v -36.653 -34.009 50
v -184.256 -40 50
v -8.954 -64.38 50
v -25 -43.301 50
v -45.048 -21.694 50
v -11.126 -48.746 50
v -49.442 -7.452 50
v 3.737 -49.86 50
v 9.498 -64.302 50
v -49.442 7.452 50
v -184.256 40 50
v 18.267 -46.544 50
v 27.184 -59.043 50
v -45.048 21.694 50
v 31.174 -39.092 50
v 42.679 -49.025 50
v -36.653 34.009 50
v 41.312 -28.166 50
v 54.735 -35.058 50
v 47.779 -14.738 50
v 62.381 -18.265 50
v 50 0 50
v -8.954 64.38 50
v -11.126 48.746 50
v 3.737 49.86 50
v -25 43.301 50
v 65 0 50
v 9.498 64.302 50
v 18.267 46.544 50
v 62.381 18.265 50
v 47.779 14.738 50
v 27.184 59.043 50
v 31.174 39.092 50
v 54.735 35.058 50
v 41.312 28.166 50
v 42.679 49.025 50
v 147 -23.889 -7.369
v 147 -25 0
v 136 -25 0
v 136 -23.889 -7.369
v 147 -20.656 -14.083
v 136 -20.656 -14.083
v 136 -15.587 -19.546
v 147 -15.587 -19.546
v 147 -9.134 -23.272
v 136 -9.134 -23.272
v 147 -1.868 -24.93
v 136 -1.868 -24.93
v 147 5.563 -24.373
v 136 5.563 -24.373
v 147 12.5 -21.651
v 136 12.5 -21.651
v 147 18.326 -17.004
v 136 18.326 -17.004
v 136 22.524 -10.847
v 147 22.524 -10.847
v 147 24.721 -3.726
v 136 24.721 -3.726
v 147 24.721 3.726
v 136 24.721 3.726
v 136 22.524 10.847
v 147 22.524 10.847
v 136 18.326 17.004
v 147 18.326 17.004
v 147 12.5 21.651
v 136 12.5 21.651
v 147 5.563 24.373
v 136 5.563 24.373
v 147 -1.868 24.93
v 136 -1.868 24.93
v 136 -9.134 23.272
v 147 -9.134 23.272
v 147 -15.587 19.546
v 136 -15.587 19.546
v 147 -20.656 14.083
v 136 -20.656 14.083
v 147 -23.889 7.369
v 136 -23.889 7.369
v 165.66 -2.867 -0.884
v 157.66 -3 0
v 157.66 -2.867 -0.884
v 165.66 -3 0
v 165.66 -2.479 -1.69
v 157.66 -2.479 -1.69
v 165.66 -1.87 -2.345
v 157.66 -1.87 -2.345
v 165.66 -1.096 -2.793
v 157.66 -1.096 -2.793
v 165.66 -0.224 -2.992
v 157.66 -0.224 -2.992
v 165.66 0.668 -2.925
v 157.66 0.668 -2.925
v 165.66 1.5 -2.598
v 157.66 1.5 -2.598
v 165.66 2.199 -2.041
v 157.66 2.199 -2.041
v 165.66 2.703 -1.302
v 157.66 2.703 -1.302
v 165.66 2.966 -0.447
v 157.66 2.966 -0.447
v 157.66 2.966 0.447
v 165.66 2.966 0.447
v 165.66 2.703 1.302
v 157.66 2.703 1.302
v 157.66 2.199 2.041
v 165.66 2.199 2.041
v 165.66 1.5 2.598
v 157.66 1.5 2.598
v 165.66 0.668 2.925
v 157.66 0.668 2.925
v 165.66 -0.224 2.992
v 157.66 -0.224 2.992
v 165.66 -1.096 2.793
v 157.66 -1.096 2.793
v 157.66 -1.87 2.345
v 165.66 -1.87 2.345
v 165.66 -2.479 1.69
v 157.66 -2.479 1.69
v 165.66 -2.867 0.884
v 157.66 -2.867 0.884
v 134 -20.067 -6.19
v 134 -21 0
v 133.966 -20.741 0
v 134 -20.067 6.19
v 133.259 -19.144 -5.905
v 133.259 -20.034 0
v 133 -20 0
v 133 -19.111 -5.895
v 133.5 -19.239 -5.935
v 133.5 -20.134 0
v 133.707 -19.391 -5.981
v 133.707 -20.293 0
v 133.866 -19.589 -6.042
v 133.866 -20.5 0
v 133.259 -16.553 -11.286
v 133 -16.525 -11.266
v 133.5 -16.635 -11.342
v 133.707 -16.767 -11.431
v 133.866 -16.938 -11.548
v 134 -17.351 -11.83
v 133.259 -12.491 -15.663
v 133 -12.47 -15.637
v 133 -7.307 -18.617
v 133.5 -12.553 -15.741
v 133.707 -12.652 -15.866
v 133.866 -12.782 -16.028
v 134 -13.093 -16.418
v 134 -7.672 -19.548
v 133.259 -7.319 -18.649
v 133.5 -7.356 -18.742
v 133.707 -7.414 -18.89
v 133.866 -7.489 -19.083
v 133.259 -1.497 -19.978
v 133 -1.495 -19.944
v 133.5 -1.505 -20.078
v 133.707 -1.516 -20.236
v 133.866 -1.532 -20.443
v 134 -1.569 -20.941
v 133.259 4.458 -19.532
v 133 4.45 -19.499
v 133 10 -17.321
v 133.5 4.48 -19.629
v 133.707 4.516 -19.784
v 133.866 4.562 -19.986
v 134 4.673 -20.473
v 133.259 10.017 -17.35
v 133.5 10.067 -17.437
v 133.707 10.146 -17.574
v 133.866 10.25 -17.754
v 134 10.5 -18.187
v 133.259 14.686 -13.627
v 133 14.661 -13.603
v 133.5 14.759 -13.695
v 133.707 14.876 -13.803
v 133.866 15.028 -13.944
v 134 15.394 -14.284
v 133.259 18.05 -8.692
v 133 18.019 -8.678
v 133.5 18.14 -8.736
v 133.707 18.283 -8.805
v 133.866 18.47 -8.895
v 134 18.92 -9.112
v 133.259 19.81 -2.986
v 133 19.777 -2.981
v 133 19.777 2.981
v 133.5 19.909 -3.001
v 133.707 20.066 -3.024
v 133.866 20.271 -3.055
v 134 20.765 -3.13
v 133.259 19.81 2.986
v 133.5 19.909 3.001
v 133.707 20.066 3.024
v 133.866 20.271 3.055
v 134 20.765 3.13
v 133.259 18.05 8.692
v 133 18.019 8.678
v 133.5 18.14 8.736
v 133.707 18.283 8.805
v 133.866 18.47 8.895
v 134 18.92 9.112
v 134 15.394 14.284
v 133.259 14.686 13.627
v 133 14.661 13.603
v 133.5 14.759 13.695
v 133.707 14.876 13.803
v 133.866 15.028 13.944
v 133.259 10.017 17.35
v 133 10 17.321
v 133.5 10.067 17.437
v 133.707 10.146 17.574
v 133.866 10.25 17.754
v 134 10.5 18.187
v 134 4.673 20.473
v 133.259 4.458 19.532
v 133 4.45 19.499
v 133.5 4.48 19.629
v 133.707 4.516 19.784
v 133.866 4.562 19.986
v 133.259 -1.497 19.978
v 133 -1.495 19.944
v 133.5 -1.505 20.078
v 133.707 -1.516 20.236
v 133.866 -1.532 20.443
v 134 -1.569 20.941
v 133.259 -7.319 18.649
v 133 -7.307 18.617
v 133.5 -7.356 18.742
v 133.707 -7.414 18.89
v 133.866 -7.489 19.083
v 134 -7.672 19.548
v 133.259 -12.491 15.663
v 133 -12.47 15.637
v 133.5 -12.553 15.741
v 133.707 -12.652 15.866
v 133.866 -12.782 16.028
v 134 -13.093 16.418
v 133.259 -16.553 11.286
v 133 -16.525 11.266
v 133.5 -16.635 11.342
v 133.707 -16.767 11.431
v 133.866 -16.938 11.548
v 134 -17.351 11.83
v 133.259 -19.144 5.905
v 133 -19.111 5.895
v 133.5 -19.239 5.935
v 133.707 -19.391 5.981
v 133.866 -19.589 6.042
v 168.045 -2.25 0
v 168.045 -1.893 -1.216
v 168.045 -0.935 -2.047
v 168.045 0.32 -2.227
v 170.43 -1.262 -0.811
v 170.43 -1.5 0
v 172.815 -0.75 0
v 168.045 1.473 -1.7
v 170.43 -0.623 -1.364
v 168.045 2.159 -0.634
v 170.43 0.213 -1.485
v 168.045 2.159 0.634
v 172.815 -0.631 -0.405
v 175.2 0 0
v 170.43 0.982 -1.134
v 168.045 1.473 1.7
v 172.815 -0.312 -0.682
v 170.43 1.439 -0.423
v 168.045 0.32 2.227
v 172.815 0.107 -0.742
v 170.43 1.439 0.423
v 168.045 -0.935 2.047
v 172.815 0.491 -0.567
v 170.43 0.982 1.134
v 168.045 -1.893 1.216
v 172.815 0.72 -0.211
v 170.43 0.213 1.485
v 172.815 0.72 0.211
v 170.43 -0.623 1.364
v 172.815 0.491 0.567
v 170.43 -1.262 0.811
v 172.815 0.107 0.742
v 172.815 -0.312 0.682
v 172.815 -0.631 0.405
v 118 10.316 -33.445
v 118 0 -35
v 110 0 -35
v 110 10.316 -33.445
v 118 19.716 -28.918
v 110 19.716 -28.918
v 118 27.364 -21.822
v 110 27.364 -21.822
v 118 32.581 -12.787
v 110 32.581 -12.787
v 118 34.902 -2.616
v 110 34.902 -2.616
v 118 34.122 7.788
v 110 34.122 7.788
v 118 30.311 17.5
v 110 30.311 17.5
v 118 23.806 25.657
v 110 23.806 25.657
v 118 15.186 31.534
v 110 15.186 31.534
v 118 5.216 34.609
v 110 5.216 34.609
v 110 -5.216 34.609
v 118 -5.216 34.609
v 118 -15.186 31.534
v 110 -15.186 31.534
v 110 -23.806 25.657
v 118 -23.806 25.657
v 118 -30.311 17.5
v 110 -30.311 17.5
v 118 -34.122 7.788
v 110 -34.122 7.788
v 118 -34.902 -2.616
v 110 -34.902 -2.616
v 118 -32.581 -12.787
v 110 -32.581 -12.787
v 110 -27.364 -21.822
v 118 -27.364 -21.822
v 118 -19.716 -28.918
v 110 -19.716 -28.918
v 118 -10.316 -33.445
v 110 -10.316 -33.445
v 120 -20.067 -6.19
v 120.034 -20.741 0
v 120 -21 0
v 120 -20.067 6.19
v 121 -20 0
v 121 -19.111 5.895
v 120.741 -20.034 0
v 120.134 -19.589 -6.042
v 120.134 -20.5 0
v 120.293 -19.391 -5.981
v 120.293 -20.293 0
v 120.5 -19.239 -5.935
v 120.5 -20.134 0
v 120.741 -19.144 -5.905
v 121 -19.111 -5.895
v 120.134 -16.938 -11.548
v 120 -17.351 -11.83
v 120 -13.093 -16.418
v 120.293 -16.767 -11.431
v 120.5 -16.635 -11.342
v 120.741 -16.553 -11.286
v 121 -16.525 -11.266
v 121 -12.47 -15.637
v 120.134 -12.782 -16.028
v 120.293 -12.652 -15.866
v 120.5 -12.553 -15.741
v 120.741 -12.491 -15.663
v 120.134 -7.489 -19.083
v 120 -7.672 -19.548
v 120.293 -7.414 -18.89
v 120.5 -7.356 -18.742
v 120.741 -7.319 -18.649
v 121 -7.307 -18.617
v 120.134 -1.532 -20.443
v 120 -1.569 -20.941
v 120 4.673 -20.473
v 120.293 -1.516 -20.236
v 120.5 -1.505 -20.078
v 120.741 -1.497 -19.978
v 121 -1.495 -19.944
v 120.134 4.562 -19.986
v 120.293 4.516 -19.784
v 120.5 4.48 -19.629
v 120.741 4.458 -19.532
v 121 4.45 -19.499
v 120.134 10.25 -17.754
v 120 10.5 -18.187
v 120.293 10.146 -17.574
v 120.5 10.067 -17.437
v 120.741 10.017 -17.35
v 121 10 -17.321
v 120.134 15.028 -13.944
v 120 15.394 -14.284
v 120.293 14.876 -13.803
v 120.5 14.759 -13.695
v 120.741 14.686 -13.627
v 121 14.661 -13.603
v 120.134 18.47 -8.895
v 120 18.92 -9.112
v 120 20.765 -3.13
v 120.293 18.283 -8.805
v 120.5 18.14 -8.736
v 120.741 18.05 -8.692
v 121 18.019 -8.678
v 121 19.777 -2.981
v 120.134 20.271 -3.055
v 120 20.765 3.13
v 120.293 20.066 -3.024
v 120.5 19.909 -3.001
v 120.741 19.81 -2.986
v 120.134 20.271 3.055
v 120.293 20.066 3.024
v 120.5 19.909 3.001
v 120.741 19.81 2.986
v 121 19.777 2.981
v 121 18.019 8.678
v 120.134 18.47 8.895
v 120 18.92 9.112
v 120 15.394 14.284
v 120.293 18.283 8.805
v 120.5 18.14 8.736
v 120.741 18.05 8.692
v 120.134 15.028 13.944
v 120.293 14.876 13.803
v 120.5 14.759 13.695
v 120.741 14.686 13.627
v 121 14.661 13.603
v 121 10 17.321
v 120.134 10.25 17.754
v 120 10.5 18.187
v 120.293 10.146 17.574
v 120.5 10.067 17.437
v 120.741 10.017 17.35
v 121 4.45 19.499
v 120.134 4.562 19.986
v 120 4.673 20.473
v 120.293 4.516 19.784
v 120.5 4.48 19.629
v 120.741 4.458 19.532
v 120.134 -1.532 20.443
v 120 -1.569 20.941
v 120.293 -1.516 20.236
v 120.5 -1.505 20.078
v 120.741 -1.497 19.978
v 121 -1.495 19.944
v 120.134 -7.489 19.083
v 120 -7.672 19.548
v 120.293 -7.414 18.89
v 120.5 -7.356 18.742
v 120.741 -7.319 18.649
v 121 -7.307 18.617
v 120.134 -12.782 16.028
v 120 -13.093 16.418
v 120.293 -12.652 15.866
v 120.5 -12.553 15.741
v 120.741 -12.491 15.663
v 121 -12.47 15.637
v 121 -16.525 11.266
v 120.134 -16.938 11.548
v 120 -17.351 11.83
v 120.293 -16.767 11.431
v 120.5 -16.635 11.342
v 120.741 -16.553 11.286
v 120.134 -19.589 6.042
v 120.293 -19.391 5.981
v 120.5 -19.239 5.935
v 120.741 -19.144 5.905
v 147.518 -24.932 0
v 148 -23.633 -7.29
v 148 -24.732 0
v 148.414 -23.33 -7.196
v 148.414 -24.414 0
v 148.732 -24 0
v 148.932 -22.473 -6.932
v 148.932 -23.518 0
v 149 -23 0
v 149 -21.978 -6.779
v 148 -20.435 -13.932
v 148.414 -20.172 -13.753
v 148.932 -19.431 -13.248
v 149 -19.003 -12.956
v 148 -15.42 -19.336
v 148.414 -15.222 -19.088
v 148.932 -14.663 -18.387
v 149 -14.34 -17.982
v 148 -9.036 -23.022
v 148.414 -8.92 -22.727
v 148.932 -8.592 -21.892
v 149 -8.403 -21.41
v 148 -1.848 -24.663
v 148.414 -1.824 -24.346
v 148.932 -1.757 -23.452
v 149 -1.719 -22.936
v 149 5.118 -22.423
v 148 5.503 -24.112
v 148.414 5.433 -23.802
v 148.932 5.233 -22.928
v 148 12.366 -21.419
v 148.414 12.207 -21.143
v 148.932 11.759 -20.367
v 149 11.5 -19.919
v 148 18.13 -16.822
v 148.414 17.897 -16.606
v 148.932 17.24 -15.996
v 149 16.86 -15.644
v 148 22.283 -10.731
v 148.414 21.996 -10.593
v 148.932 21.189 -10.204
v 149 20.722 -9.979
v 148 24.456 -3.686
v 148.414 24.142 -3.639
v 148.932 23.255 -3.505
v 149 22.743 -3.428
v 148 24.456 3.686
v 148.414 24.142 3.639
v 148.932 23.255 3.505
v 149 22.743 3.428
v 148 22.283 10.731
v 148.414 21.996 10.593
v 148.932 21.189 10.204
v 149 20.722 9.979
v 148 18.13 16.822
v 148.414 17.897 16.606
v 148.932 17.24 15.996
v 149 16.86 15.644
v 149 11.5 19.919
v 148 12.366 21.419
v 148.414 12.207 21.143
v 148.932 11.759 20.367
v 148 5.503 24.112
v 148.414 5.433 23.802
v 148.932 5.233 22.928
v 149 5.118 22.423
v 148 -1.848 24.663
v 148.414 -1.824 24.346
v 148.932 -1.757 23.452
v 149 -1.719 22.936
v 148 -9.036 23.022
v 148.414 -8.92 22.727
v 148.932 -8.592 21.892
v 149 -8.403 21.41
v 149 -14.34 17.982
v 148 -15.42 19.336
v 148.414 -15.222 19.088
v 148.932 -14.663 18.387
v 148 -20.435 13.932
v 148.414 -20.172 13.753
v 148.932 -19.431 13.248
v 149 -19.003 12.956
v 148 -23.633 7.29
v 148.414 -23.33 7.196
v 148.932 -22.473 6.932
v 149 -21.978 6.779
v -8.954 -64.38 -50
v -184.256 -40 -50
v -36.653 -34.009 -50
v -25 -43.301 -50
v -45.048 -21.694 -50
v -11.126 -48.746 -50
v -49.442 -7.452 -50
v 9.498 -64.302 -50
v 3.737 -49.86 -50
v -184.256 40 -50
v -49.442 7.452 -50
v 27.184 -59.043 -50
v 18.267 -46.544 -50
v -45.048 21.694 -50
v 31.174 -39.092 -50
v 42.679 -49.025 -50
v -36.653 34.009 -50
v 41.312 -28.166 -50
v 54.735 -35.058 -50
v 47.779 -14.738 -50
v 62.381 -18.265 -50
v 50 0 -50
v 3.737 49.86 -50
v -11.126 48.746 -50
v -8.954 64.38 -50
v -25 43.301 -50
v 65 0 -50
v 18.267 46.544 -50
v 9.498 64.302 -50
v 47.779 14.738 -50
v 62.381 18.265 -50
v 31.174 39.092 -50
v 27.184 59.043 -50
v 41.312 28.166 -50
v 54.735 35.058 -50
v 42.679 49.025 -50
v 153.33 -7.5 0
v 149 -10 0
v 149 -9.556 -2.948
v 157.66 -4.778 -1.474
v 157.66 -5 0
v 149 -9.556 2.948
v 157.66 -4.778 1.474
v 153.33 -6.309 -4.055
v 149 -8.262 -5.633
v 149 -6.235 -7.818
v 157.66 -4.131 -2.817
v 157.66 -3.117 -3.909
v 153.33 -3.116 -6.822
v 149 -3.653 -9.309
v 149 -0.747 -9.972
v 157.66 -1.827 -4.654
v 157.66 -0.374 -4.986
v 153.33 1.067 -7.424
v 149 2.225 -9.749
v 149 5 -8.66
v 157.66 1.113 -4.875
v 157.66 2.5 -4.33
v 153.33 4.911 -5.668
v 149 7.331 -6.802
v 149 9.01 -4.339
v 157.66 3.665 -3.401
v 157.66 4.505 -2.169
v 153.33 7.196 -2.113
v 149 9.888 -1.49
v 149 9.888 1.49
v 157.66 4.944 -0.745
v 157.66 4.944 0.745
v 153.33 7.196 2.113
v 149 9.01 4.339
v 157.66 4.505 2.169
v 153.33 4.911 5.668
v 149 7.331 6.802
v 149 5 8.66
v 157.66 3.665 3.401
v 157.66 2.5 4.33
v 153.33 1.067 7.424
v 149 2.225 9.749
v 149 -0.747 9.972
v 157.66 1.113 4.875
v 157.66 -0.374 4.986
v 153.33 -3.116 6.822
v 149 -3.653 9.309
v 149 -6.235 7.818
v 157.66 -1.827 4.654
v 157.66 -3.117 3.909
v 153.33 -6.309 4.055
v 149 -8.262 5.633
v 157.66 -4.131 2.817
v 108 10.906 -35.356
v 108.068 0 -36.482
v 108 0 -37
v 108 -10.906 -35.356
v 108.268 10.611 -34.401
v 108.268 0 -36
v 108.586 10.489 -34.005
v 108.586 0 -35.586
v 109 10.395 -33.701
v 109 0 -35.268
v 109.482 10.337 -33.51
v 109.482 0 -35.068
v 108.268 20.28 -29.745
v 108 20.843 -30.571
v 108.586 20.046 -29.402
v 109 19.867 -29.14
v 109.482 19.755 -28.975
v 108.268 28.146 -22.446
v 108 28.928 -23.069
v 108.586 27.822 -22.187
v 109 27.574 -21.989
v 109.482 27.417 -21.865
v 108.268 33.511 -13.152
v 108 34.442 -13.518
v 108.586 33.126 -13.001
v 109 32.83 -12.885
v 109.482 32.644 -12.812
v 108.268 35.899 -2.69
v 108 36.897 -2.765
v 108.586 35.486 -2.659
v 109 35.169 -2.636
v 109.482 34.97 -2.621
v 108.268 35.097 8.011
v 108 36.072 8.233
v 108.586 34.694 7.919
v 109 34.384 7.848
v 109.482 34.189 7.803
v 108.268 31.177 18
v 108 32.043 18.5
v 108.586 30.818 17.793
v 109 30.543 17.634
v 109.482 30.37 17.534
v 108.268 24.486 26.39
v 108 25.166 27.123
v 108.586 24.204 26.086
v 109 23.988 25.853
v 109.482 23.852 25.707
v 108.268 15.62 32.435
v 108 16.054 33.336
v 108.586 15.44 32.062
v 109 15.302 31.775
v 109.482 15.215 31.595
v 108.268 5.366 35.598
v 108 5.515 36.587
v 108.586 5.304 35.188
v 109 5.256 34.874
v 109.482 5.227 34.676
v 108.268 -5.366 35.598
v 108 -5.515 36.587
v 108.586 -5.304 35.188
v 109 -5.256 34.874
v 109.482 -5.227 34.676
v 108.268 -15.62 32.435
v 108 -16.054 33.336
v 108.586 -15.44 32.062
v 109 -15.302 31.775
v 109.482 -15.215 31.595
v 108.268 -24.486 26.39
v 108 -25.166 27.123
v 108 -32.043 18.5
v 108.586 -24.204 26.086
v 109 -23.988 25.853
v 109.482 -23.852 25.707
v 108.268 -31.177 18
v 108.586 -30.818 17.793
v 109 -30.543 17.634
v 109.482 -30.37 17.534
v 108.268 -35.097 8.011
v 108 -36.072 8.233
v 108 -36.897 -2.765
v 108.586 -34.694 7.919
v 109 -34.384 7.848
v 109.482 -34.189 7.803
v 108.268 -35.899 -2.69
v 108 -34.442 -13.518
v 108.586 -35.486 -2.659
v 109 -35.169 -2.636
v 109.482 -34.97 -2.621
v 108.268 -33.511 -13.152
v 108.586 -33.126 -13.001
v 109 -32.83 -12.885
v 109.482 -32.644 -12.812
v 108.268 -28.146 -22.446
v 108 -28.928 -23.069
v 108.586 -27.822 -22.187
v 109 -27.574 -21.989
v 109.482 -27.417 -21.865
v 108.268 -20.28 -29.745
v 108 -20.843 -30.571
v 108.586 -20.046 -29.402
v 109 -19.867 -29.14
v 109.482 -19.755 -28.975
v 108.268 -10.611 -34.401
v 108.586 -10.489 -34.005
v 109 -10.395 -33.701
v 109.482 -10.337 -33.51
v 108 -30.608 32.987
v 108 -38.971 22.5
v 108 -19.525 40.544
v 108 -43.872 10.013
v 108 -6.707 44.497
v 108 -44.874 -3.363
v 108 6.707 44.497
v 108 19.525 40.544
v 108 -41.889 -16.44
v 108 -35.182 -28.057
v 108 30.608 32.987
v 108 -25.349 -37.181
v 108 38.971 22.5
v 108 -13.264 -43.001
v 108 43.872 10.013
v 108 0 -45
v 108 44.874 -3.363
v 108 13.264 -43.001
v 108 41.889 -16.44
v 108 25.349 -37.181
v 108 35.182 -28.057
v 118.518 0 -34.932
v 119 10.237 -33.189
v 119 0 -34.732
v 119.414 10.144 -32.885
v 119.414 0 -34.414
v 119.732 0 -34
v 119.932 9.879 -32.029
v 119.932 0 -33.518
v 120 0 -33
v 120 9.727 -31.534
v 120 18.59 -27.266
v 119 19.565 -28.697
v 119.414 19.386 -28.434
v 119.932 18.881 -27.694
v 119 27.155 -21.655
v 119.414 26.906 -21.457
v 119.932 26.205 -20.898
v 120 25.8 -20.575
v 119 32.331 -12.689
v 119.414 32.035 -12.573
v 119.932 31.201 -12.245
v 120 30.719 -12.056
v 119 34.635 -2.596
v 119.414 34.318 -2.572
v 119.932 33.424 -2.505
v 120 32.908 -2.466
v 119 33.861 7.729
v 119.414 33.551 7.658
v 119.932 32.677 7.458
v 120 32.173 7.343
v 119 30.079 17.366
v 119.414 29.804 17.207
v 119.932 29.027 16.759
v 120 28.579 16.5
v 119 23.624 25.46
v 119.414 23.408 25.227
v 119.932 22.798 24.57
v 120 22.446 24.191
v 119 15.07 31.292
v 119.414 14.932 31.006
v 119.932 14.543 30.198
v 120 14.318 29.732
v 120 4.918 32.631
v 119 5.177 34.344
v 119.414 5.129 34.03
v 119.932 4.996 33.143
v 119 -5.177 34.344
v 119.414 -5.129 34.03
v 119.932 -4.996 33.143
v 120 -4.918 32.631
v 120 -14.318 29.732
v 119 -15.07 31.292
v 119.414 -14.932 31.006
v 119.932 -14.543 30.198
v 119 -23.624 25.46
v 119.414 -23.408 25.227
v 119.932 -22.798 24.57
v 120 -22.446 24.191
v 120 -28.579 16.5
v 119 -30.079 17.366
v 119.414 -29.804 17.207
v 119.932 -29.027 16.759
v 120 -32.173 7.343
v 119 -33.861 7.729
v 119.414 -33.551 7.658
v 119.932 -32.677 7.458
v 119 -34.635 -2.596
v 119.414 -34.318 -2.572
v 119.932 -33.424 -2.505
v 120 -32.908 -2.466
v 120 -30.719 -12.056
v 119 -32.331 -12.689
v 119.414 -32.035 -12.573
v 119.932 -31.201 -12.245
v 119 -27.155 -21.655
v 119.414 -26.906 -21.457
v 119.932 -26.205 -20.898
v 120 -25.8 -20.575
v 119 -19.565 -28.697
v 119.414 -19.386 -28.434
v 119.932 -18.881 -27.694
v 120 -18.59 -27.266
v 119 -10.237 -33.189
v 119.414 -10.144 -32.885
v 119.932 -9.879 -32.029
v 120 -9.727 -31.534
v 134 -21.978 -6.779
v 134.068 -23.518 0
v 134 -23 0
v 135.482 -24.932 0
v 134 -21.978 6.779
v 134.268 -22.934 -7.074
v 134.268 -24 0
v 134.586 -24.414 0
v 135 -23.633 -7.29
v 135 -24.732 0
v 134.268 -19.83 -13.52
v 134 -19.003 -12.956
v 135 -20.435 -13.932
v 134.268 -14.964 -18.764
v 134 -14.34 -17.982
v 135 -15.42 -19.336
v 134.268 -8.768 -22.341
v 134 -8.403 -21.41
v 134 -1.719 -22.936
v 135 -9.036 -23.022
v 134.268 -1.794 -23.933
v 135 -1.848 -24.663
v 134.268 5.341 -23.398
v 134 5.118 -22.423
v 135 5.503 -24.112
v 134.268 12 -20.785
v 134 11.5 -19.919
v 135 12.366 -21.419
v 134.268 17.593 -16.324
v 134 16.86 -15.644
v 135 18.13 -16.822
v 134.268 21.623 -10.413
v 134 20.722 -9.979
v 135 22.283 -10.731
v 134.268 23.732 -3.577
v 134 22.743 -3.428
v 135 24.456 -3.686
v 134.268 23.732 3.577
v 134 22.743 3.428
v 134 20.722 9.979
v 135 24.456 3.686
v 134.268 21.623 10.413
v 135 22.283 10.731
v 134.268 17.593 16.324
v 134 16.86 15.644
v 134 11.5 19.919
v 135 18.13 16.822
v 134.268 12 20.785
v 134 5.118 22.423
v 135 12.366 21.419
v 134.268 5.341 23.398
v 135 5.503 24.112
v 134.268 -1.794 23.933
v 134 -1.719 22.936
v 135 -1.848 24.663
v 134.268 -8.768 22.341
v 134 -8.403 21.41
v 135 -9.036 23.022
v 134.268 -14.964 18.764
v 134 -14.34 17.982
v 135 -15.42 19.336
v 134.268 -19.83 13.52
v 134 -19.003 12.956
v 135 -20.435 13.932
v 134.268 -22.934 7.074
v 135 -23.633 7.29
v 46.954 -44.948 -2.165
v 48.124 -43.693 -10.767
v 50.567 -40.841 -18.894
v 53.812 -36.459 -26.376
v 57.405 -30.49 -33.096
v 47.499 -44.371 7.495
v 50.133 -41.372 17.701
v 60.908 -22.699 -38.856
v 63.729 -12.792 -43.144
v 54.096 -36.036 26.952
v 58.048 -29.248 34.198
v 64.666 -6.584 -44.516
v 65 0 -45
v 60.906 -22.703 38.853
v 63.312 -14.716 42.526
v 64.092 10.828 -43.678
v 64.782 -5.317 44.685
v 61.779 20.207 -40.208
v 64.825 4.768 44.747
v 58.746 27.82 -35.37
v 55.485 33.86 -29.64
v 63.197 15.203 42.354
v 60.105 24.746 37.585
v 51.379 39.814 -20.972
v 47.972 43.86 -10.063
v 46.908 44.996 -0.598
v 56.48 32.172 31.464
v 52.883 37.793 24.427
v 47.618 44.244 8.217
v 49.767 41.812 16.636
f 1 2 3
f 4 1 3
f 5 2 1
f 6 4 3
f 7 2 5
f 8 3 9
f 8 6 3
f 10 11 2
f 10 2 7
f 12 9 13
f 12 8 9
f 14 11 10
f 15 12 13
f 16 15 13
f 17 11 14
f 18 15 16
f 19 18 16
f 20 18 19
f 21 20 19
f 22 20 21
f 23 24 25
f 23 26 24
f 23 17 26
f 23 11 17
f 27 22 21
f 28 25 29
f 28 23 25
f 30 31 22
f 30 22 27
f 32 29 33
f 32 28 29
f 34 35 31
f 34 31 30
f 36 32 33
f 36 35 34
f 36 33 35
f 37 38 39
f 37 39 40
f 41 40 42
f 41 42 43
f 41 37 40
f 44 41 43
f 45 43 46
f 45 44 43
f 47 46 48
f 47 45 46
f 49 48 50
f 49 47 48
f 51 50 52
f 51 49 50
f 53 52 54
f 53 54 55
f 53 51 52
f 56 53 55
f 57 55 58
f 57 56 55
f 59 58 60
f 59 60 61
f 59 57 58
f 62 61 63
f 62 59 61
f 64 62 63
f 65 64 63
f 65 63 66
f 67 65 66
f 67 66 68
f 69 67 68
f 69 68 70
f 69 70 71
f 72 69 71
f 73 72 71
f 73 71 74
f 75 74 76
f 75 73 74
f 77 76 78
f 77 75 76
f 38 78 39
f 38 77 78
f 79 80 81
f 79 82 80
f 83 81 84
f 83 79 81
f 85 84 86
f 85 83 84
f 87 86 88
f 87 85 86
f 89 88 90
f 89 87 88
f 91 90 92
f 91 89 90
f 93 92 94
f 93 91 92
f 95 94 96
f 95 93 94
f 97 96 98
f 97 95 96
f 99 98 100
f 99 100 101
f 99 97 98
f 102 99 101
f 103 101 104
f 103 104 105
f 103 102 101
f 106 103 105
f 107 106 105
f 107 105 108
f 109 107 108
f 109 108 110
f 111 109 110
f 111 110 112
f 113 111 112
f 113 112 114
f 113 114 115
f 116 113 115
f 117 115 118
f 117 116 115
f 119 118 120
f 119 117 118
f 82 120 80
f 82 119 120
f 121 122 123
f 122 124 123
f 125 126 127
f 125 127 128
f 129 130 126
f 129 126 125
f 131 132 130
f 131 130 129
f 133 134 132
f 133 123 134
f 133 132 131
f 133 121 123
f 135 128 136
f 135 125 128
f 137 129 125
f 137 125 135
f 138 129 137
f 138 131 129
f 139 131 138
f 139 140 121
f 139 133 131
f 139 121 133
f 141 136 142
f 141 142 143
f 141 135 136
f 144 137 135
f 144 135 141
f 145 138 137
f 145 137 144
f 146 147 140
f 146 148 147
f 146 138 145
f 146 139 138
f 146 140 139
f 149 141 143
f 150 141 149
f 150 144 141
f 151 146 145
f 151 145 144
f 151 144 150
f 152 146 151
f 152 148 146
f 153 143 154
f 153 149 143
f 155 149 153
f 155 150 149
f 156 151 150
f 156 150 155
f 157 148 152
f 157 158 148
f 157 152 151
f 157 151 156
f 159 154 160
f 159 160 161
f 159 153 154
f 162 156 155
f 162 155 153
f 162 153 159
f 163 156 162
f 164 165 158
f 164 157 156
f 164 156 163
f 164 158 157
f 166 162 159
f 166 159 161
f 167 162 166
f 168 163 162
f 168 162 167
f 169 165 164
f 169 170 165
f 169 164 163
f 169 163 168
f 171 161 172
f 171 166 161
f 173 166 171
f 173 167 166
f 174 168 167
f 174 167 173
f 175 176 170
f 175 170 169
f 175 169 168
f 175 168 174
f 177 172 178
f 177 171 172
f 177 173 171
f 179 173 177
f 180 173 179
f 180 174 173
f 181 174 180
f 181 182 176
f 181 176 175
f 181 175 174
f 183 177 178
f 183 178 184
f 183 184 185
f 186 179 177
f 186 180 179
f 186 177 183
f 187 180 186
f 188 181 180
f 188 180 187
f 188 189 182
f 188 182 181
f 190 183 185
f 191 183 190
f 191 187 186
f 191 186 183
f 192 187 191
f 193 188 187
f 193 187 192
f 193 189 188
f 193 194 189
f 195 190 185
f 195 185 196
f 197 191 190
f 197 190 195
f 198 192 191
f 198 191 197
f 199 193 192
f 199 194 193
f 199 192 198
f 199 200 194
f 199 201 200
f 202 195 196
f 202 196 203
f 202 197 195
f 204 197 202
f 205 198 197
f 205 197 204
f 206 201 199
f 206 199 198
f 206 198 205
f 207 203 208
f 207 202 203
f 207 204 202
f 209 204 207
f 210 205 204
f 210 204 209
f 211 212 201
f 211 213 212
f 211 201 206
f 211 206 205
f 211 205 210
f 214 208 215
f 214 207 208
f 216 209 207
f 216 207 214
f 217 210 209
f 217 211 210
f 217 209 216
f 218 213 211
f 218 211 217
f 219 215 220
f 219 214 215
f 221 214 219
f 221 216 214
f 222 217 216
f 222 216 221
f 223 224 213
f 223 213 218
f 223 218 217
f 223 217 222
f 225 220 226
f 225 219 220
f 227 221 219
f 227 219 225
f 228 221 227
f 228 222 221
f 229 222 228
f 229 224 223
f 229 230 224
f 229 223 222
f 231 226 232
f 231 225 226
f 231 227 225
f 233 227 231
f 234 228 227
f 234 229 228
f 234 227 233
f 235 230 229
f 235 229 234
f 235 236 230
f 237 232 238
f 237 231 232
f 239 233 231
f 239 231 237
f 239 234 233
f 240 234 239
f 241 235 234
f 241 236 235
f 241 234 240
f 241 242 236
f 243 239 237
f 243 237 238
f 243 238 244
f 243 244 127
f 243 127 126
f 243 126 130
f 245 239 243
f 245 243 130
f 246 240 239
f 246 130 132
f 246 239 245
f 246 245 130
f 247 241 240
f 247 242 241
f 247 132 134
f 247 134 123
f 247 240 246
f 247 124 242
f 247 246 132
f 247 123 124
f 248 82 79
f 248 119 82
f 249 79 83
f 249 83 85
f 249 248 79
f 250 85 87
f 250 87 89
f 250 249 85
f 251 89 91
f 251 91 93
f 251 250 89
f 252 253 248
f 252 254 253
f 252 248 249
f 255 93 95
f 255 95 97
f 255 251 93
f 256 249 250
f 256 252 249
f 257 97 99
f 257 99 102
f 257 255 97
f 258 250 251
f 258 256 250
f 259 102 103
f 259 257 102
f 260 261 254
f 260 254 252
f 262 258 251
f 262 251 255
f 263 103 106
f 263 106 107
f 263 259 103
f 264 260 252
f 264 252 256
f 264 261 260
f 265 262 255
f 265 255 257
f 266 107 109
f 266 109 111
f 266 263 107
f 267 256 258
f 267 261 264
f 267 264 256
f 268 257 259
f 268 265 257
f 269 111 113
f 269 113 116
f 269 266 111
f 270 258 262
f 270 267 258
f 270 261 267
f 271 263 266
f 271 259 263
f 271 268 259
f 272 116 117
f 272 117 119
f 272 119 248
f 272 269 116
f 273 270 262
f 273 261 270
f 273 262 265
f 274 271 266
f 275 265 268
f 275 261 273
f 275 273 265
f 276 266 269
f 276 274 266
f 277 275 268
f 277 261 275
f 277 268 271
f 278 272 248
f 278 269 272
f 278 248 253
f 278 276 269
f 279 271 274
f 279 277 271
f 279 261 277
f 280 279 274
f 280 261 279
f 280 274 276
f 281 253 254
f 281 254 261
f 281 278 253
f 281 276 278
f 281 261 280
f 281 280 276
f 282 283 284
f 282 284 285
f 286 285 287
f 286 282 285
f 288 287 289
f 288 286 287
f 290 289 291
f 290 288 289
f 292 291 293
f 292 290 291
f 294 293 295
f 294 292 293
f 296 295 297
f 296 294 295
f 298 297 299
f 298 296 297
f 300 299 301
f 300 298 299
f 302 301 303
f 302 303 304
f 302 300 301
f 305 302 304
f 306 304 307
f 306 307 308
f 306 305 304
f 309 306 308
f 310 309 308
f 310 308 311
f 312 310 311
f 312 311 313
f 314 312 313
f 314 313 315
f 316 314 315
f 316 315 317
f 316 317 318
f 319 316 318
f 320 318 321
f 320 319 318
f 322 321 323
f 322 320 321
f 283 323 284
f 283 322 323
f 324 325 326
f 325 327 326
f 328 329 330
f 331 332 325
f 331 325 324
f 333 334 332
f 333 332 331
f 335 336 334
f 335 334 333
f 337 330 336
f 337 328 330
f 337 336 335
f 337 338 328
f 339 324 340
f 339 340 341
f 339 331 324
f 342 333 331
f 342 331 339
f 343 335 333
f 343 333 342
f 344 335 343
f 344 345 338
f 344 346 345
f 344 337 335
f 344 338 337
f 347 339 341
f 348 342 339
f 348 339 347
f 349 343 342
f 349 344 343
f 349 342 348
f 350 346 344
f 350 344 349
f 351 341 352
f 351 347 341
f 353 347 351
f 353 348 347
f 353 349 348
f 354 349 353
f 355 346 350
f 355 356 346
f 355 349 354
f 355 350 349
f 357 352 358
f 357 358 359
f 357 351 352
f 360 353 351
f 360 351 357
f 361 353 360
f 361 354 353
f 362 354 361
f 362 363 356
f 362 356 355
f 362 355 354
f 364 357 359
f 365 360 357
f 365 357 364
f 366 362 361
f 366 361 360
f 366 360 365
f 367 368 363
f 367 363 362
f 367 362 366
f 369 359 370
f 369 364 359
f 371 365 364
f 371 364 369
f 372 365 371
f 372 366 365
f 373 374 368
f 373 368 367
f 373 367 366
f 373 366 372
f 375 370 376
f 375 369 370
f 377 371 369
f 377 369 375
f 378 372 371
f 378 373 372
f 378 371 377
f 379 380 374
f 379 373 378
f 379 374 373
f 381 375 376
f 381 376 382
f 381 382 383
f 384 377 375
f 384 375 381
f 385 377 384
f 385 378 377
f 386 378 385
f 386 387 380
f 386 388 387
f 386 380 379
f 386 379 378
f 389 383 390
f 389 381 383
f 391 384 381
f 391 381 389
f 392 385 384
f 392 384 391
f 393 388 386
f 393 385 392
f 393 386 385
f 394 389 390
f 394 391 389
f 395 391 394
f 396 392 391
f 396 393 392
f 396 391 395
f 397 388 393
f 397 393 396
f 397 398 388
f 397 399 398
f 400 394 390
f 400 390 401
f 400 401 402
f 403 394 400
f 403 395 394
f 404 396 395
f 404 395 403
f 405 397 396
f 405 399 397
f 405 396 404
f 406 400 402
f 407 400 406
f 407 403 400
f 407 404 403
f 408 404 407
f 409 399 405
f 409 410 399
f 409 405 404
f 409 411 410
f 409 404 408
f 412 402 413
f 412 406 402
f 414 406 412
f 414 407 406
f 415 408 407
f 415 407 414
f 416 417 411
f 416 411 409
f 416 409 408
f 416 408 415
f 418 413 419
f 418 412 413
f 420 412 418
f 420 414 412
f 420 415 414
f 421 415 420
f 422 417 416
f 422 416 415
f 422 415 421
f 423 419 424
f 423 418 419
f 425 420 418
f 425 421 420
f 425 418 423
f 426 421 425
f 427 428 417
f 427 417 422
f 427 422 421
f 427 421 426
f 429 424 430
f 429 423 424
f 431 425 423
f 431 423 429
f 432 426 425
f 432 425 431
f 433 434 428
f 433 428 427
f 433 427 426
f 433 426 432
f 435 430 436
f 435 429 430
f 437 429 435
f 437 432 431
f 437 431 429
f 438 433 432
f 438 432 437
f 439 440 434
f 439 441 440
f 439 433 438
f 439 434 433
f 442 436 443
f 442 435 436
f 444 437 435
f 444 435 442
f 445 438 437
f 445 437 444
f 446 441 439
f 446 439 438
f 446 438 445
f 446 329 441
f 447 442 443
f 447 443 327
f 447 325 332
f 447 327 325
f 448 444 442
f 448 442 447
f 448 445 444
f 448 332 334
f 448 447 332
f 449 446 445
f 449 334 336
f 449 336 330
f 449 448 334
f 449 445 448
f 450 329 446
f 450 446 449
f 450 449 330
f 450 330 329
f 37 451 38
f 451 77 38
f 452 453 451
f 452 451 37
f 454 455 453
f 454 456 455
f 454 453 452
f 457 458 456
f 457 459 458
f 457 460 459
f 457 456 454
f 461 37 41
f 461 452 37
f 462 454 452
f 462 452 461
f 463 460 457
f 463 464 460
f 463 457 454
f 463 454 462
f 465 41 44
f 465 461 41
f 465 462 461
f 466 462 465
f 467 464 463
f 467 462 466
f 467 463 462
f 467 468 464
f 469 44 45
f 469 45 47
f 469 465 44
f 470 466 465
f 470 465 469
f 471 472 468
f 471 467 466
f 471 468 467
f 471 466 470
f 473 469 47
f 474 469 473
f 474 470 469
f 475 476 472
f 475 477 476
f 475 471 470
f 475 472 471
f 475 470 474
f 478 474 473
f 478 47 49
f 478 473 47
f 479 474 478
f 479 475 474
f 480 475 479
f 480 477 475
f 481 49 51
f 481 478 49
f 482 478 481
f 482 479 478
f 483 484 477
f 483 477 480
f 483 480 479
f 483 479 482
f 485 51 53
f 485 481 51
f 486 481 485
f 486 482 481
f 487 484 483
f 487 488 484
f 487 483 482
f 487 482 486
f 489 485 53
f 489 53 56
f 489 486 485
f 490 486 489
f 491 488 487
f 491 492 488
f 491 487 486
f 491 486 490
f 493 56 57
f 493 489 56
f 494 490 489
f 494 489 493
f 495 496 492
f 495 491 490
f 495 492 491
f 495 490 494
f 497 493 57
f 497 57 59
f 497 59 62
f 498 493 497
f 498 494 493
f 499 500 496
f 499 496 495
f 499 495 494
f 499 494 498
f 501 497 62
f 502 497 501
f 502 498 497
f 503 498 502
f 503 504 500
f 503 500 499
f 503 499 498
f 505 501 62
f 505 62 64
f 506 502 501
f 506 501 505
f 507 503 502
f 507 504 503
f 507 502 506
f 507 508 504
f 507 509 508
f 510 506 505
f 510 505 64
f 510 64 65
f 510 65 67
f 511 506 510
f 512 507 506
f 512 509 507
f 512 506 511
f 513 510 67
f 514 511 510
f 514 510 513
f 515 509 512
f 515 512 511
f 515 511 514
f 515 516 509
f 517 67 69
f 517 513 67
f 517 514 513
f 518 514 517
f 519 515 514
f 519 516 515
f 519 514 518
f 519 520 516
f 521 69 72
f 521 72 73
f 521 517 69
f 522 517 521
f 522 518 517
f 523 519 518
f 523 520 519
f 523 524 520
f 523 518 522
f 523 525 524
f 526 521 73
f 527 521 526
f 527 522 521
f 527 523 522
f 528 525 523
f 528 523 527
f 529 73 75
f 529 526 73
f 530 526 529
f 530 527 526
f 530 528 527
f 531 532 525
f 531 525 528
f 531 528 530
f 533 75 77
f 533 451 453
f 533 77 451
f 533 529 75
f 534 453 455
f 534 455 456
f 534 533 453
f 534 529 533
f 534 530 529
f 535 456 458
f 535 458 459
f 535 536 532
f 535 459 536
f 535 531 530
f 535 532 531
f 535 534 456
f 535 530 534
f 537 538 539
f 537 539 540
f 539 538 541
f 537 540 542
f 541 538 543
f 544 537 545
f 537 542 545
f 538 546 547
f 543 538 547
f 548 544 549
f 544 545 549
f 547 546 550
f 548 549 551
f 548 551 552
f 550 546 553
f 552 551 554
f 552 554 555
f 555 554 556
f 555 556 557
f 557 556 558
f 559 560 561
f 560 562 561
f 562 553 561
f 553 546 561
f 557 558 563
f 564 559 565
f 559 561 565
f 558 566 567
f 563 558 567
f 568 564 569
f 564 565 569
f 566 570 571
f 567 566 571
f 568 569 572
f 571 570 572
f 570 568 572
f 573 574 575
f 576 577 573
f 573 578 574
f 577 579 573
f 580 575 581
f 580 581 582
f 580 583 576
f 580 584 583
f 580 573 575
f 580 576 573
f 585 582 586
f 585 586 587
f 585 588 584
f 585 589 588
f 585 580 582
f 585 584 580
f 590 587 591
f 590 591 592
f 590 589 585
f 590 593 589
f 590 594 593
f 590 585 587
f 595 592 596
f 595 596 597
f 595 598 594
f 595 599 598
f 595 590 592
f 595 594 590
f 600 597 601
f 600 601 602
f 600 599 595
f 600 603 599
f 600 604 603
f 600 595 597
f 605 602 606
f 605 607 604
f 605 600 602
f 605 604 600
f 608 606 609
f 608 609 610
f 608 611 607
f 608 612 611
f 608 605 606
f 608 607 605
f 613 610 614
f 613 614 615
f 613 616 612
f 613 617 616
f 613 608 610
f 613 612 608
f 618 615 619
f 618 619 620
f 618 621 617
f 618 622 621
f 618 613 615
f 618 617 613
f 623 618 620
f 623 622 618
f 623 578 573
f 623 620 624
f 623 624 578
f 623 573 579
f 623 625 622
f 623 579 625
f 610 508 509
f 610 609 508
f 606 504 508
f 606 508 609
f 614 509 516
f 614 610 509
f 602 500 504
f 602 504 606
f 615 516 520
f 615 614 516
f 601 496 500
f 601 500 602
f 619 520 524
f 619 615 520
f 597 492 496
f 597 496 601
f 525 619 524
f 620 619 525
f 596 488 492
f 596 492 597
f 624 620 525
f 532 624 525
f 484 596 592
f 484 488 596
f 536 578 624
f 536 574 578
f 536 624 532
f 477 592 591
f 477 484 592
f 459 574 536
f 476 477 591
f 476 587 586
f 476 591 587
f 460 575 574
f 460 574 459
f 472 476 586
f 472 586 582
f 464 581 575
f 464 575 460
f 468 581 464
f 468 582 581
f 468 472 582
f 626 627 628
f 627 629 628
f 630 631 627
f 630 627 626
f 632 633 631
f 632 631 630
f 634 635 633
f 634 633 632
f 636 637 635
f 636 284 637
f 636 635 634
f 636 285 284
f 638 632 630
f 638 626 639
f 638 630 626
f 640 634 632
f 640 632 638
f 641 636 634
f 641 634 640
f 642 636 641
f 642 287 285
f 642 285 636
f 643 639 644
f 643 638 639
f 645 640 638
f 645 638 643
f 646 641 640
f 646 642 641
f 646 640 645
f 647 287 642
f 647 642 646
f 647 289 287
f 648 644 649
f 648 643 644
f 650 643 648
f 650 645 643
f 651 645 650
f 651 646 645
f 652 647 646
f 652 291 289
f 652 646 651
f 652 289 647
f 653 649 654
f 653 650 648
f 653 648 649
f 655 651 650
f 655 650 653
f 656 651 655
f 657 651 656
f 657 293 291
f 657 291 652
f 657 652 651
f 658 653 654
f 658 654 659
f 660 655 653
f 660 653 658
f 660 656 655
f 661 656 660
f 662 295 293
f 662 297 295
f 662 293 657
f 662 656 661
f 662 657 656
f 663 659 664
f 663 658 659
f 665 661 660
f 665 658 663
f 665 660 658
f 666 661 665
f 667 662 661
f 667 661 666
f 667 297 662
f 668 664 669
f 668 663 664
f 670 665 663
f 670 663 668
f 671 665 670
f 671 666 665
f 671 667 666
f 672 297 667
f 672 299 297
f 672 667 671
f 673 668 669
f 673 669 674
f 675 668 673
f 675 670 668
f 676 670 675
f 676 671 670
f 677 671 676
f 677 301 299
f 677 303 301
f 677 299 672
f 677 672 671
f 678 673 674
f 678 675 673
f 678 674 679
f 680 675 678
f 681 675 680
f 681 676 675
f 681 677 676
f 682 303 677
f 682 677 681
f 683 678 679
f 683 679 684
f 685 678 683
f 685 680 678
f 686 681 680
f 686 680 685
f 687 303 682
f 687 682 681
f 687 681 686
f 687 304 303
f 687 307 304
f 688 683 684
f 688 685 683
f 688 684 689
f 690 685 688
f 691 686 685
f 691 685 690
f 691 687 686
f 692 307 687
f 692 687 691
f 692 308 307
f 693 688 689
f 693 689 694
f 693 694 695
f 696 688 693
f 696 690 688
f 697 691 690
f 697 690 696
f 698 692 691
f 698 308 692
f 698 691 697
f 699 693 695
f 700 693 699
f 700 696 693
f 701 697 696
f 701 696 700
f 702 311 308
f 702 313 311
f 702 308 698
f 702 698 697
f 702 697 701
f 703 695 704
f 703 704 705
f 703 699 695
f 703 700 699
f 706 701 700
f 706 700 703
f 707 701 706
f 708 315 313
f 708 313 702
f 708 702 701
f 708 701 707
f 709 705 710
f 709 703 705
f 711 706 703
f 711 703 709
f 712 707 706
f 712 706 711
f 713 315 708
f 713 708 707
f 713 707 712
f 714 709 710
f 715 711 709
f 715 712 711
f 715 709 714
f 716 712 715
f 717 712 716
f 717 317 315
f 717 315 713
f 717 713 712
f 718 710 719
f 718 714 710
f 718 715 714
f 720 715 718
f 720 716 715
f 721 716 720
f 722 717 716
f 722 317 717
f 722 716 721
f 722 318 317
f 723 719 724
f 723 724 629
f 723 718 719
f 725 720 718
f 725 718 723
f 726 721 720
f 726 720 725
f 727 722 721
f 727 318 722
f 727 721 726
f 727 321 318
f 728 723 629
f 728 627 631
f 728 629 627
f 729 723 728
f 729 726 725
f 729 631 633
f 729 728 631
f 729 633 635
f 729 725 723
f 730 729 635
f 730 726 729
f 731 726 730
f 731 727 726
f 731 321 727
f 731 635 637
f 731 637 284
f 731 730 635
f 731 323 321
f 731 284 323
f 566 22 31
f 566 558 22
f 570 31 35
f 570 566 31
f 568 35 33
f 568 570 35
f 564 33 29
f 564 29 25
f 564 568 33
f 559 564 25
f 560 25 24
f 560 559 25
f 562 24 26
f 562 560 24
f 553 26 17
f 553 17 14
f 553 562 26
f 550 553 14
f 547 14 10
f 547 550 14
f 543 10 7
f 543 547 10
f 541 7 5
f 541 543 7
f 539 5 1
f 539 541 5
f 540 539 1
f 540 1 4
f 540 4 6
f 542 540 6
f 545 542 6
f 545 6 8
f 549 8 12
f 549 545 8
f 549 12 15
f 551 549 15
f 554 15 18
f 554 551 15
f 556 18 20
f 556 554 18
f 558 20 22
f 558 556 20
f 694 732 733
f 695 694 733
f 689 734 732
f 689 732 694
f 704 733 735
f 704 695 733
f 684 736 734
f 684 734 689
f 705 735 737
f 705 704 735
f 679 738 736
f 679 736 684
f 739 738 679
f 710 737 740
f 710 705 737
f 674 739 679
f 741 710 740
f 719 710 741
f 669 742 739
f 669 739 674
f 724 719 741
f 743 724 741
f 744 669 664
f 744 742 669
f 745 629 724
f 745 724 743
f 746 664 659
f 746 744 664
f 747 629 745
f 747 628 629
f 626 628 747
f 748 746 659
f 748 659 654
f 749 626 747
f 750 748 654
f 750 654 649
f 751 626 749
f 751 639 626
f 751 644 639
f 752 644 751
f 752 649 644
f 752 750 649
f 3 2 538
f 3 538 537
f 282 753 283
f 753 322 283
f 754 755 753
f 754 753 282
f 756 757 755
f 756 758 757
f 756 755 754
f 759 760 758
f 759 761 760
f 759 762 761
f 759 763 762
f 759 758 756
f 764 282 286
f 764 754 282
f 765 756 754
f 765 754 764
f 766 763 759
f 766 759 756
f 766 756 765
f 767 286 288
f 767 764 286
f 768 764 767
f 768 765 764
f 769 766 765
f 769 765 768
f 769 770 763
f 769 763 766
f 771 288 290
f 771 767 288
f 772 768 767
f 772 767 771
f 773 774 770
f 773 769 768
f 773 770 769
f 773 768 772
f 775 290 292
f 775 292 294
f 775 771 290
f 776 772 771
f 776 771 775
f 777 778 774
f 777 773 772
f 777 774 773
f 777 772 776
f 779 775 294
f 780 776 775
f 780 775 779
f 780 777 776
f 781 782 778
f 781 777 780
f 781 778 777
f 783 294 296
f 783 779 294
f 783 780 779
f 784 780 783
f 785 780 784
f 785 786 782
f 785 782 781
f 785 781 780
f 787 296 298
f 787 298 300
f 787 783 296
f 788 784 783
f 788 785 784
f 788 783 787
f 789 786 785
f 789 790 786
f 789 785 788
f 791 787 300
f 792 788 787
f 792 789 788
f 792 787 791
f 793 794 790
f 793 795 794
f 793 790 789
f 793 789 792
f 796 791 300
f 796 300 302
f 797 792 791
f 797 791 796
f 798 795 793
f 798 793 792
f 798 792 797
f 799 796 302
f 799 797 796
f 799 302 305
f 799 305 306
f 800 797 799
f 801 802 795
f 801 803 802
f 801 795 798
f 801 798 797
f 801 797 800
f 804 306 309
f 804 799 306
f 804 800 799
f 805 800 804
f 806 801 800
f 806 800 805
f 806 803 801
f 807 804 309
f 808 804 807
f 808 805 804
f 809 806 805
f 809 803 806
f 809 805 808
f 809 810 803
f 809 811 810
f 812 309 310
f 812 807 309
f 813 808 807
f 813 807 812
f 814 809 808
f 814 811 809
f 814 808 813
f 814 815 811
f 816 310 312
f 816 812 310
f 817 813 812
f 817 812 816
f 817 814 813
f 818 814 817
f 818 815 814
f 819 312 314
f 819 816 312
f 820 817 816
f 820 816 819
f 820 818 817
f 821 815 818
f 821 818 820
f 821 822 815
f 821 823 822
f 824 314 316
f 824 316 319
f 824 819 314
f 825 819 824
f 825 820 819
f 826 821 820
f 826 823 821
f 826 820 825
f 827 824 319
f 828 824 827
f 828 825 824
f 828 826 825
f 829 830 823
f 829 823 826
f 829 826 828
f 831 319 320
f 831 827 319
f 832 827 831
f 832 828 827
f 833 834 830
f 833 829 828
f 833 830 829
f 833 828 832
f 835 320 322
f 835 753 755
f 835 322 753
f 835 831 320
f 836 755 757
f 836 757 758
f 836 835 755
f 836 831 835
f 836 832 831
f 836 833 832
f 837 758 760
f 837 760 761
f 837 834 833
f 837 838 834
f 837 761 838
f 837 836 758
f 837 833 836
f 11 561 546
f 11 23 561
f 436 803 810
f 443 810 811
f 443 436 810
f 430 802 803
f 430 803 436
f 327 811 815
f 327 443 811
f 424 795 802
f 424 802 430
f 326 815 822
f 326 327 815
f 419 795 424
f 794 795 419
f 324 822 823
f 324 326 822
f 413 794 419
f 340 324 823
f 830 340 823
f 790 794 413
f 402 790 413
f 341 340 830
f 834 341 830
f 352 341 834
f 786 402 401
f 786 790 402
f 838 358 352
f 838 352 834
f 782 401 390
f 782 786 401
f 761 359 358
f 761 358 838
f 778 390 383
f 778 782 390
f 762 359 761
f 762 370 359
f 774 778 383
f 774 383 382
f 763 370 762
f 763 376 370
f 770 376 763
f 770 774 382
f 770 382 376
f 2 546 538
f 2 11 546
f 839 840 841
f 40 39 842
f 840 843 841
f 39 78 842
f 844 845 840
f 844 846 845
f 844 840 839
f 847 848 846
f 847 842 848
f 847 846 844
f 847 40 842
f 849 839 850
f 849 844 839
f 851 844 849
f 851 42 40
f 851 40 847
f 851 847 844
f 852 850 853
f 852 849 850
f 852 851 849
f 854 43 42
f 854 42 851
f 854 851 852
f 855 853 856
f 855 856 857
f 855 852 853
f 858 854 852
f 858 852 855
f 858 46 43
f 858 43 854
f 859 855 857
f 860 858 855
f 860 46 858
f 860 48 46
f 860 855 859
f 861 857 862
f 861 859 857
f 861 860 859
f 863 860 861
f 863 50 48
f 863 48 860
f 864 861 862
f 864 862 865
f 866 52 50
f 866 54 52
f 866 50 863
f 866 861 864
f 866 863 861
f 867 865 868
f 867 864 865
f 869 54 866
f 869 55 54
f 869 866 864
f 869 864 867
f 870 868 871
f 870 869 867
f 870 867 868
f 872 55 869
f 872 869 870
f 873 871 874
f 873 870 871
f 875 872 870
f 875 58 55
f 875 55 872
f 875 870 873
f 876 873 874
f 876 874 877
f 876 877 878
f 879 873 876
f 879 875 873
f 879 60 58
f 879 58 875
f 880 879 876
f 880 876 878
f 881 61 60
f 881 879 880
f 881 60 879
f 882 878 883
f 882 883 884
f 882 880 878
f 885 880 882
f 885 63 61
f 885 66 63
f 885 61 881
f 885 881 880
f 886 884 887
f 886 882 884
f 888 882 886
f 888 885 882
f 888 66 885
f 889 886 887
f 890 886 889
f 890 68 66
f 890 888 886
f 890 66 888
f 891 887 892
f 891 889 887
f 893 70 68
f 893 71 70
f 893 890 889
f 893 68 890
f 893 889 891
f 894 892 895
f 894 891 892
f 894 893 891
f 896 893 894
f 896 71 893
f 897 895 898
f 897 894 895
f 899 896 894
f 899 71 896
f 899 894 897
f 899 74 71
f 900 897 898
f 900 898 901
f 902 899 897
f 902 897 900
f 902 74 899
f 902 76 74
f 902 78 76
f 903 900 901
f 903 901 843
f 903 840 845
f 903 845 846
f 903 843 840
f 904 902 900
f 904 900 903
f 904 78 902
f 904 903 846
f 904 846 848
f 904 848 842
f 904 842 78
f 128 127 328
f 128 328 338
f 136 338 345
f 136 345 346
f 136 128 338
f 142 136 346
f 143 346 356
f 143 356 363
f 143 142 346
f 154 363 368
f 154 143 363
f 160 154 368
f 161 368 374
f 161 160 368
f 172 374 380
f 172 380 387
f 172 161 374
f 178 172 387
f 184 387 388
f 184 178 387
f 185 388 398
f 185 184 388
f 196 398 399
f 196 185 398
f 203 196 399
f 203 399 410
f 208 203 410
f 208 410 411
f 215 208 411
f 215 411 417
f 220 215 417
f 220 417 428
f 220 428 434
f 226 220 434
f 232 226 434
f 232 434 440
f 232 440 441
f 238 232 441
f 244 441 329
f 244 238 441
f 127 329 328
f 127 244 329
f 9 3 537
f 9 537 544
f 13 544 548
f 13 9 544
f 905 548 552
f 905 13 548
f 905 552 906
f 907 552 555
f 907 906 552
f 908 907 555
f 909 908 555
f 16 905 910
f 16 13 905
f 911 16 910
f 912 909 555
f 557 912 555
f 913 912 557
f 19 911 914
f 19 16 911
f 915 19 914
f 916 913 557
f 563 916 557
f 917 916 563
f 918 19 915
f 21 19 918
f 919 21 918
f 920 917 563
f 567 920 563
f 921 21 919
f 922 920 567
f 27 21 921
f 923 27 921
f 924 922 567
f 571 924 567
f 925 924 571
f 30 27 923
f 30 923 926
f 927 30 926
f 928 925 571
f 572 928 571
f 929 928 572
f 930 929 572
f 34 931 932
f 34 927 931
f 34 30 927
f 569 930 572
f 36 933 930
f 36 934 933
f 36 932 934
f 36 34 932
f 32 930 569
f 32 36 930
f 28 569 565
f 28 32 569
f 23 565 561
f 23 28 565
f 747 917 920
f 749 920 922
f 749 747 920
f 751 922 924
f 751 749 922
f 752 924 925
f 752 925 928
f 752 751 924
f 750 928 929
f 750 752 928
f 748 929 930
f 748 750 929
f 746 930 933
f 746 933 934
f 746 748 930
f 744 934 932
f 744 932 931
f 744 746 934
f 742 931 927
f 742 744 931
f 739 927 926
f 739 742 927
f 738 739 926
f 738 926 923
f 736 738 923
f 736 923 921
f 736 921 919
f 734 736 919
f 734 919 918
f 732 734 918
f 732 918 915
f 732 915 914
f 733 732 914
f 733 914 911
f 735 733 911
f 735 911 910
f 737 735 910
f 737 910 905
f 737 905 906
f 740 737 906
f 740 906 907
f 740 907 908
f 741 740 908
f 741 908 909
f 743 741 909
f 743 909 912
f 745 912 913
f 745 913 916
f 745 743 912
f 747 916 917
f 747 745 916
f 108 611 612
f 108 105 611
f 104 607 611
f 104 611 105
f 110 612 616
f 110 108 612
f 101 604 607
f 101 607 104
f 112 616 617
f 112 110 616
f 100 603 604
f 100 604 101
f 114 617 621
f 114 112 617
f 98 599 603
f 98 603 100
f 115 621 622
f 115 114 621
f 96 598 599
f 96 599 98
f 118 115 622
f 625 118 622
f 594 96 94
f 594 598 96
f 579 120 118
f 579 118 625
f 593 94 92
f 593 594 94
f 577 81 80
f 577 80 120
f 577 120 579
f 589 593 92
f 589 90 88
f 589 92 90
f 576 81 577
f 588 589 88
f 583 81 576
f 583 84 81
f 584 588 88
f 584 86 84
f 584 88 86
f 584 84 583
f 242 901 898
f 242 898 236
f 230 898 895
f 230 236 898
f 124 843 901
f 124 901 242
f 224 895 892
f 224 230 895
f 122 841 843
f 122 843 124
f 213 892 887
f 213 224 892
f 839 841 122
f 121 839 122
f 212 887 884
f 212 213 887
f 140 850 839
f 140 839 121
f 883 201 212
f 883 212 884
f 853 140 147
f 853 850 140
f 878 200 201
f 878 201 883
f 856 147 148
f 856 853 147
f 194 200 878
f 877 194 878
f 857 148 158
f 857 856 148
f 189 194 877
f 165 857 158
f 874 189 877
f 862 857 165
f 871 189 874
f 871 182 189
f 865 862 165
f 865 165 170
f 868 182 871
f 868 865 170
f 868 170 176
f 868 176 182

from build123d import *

# Parameters (mm, degrees)
SKETCH1_R           = 50
BOSS_EXTRUDE1_DEPTH = 50
BOSS_EXTRUDE2_REACH = 306.256
SKETCH2_R           = 45
SKETCH4_R           = 45
SKETCH4_R_2         = 35
CUT_EXTRUDE2_DEPTH  = 12
FILLET1_R           = 2
FILLET2_R           = 1


with BuildPart() as part:
    # Sketch1 → Boss-Extrude1 (new body, symmetric)
    with BuildSketch(Plane.XY):
        with BuildLine():
            Line((-184.256419232, 40), (-184.256419232, -40))
            Line((-184.256419232, -40), (-8.953748927, -64.380357099))
            ThreePointArc((-8.953748927, -64.380357099), (65, 0), (-8.953748927, 64.380357099))
            Line((-8.953748927, 64.380357099), (-184.256419232, 40))
        make_face()
        Circle(SKETCH1_R, mode=Mode.SUBTRACT)
    extrude(amount=BOSS_EXTRUDE1_DEPTH, both=True)

    # Sketch2 → Boss-Extrude2 (add, up to next)
    with BuildSketch(Plane(origin=(120, 0, 0), x_dir=(0, 0, -1), z_dir=(1, 0, 0)), mode=Mode.PRIVATE) as boss_extrude2_sk1:
        Circle(SKETCH2_R)
    boss_extrude2_tool1 = extrude(boss_extrude2_sk1.sketch, amount=-BOSS_EXTRUDE2_REACH, mode=Mode.PRIVATE) - part.part
    add(boss_extrude2_tool1.solids().sort_by_distance((120, 0, 0))[0])

    # Sketch3 → Revolve1 (revolve)
    with BuildSketch(Plane.XY):
        Polygon((120, 0), (120, -20), (134, -20), (134, -25), (149, -25), (149, -10), (157.660254038, -5), (157.660254038, -3), (165.660254038, -3), (175.199646052, 0), align=None)
    revolve(axis=Axis((0, 0, 0), (1, 0, 0)))

    # Sketch4 → Cut-Extrude2 (cut)
    with BuildSketch(Plane(origin=(120, 0, 0), x_dir=(0, 0, -1), z_dir=(1, 0, 0))):
        Circle(SKETCH4_R)
        Circle(SKETCH4_R_2, mode=Mode.SUBTRACT)
    extrude(amount=-CUT_EXTRUDE2_DEPTH, mode=Mode.SUBTRACT)

    # Fillet1
    fillet1_edges = [part.edges().sort_by_distance(p)[0] for p in [
        (134, 25, 0),
        (149, 25, 0),
        (108, 0, 35),
        (120, 0, 35),
    ]]
    fillet(fillet1_edges, radius=FILLET1_R)

    # Fillet2
    fillet2_edges = [part.edges().sort_by_distance(p)[0] for p in [
        (120, 20, 0),
        (134, 20, 0),
    ]]
    fillet(fillet2_edges, radius=FILLET2_R)


solid = part.part
